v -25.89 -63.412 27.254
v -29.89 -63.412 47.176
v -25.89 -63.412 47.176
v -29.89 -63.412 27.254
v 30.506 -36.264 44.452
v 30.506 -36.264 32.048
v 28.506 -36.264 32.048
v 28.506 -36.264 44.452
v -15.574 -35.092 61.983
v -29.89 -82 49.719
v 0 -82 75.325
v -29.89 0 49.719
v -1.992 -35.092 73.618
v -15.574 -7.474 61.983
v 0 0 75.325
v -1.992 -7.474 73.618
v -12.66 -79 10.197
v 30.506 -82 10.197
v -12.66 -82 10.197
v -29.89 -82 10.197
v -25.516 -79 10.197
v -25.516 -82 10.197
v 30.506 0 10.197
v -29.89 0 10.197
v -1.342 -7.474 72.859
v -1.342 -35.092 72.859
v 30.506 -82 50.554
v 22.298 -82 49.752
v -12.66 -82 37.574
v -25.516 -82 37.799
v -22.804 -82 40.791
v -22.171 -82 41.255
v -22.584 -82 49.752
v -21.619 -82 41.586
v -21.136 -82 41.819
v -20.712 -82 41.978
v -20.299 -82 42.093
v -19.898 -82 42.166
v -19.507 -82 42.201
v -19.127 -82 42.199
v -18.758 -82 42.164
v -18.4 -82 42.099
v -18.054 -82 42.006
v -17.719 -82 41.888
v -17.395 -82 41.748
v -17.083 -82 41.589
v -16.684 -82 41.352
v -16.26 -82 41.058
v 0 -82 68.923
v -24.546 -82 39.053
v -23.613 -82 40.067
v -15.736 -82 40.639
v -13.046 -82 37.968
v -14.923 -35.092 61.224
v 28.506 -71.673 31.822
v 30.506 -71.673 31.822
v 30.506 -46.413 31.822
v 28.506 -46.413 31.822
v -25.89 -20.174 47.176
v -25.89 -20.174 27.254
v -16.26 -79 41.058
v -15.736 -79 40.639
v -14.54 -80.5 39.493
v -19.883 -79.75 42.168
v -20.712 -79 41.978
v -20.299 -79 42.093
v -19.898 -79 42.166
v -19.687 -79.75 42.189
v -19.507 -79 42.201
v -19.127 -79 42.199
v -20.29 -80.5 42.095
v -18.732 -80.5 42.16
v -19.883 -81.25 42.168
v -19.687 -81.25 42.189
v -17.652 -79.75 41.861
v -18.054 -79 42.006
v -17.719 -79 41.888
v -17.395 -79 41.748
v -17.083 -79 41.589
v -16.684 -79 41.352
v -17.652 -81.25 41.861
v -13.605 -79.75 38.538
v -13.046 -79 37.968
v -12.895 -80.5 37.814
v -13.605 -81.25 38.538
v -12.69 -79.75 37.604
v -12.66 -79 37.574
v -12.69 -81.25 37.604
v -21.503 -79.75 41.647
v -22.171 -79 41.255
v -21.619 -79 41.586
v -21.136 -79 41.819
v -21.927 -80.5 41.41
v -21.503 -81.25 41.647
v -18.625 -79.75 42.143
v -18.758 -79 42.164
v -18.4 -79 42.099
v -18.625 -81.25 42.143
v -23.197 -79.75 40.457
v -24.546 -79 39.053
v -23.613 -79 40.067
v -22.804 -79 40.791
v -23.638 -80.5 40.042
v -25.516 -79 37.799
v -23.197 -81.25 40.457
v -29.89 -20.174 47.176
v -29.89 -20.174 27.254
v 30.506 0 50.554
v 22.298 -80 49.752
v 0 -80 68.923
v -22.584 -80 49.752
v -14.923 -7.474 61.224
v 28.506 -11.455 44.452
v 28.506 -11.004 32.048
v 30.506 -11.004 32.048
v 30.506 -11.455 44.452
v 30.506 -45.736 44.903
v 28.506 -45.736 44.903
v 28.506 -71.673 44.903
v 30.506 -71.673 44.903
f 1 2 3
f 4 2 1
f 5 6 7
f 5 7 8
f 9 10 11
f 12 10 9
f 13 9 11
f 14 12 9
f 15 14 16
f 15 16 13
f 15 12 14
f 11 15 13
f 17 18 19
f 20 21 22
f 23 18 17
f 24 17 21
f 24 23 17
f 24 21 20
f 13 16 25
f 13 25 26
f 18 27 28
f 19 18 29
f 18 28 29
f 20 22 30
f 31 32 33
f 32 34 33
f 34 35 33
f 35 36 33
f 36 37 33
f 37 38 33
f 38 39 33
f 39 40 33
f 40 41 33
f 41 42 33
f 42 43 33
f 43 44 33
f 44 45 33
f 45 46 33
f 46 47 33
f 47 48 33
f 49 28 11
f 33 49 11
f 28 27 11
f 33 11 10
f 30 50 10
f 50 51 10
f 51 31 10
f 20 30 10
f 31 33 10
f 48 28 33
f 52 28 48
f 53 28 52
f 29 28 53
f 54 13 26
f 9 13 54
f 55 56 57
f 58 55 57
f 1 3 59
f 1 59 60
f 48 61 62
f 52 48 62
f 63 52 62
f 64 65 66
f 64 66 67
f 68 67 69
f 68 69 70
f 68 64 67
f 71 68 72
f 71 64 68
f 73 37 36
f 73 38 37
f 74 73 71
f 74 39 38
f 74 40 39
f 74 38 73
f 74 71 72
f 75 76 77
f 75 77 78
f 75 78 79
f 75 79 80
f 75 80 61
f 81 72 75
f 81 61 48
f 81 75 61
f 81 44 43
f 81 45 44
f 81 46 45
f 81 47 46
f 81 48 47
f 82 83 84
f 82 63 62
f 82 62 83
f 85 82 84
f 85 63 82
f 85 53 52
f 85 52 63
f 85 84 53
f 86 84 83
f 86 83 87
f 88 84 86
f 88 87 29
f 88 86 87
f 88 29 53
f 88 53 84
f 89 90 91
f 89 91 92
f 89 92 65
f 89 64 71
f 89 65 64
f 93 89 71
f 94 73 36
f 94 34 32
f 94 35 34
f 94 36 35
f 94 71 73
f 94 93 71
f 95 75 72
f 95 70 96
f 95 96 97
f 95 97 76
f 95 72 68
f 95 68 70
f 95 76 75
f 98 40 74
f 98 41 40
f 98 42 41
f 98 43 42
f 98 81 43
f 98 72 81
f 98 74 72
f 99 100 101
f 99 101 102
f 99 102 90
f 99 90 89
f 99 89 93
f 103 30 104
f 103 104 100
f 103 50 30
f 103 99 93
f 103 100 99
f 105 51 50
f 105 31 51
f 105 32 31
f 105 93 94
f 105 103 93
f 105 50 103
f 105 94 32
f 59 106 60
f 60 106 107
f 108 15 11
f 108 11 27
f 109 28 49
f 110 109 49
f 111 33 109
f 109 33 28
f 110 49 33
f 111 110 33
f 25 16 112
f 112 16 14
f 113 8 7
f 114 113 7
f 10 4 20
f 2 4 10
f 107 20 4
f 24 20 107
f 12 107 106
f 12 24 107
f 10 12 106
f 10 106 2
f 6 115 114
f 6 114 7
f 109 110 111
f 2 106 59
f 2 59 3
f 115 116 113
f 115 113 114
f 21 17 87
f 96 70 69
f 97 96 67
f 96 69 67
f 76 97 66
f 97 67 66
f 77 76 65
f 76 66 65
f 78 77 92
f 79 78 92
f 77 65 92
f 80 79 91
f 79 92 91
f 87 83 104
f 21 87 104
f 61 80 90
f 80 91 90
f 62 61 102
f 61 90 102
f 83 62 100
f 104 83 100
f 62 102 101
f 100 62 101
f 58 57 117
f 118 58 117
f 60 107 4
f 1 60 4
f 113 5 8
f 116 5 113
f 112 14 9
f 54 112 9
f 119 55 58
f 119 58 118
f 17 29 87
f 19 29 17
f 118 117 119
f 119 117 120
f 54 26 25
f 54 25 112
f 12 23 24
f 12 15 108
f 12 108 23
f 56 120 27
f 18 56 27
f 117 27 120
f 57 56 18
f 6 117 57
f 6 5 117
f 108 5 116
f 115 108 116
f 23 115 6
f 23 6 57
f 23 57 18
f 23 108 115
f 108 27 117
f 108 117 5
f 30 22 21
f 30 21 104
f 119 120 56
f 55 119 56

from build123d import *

# Parameters (mm, degrees)
PAD_DEPTH            = 82
POCKET_DEPTH         = 3
POCKET001_DEPTH      = 2
POCKET002_DEPTH      = 2
SKETCH007_W          = 17.883893
SKETCH007_H          = 27.618155
POCKET003_DEPTH      = 1
SKETCH009_W          = 19.921296
SKETCH009_H          = 43.238262
POCKET004_DEPTH      = 4
BODY_PLACEMENT_ANGLE = 90


with BuildPart() as part:
    # Sketch → Pad (new body)
    with BuildSketch(Plane.XY):
        Polygon((30.506308, 10.196762), (-29.890312, 10.196762), (-29.890312, 49.718979), (0, 75.324928), (30.506308, 50.553959), align=None)
    extrude(amount=PAD_DEPTH)

    # Sketch001 (on Face7 of Pad) → Pocket (cut)
    with BuildSketch(Plane.XY.offset(82)):
        with BuildLine():
            Line((-25.5156, 10.058528), (-25.5156, 37.7992))
            add(Edge.make_bspline(
                [(-25.5156, 37.7992), (-20.1793, 45.2511), (-12.6602, 37.5736), (-12.6602, 37.5736), (-12.6602, 37.5736)],
                knots=[0, 0, 0, 0, 0.5, 1, 1, 1, 1], degree=3))
            Line((-12.6602, 37.5736), (-12.6602, 10.058528))
            Line((-12.6602, 10.058528), (-25.5156, 10.058528))
        make_face()
    extrude(amount=-POCKET_DEPTH, mode=Mode.SUBTRACT)

    # Sketch002 (on Face4 of Pocket) → Pocket001 (cut)
    with BuildSketch(Plane.XY.offset(82)):
        Polygon((0, 68.922791), (-22.583693, 49.75243), (22.297503, 49.75243), align=None)
    extrude(amount=-POCKET001_DEPTH, mode=Mode.SUBTRACT)

    # Sketch003 (on Face8 of Pocket001) → Pocket002 (cut)
    with BuildSketch(Plane.YZ.offset(30.506308)):
        Polygon((31.822407, 71.672646), (31.822407, 46.41288), (44.903366, 45.736275), (44.903366, 71.672646), align=None)
        Polygon((32.047943, 36.263863), (44.45229, 36.263863), (44.45229, 11.455163), (32.047943, 11.004096), align=None)
    extrude(amount=-POCKET002_DEPTH, mode=Mode.SUBTRACT)

    # Sketch007 (on Face9 of Pocket002) → Pocket003 (cut)
    with BuildSketch(Plane(origin=(-37.216188, 43.443166, 0), x_dir=(-0.759436, -0.650582, 0), z_dir=(-0.650582, 0.759436, 0))):
        with Locations((-37.439836, 21.282723)):
            Rectangle(SKETCH007_W, SKETCH007_H)
    extrude(amount=-POCKET003_DEPTH, mode=Mode.SUBTRACT)

    # Sketch009 (on Face3 of Pocket003) → Pocket004 (cut)
    with BuildSketch(Plane(origin=(-29.890312, 0, 0), x_dir=(0, -1, 0), z_dir=(-1, 0, 0))):
        with Locations((-37.215107, 41.792734)):
            Rectangle(SKETCH009_W, SKETCH009_H)
    extrude(amount=-POCKET004_DEPTH, mode=Mode.SUBTRACT)


with BuildPart() as part_1:
    # Body placement: moved
    add(part.part.rotate(Axis((0, 0, 0), (1, 0, 0)), BODY_PLACEMENT_ANGLE))


solid = part_1.part
